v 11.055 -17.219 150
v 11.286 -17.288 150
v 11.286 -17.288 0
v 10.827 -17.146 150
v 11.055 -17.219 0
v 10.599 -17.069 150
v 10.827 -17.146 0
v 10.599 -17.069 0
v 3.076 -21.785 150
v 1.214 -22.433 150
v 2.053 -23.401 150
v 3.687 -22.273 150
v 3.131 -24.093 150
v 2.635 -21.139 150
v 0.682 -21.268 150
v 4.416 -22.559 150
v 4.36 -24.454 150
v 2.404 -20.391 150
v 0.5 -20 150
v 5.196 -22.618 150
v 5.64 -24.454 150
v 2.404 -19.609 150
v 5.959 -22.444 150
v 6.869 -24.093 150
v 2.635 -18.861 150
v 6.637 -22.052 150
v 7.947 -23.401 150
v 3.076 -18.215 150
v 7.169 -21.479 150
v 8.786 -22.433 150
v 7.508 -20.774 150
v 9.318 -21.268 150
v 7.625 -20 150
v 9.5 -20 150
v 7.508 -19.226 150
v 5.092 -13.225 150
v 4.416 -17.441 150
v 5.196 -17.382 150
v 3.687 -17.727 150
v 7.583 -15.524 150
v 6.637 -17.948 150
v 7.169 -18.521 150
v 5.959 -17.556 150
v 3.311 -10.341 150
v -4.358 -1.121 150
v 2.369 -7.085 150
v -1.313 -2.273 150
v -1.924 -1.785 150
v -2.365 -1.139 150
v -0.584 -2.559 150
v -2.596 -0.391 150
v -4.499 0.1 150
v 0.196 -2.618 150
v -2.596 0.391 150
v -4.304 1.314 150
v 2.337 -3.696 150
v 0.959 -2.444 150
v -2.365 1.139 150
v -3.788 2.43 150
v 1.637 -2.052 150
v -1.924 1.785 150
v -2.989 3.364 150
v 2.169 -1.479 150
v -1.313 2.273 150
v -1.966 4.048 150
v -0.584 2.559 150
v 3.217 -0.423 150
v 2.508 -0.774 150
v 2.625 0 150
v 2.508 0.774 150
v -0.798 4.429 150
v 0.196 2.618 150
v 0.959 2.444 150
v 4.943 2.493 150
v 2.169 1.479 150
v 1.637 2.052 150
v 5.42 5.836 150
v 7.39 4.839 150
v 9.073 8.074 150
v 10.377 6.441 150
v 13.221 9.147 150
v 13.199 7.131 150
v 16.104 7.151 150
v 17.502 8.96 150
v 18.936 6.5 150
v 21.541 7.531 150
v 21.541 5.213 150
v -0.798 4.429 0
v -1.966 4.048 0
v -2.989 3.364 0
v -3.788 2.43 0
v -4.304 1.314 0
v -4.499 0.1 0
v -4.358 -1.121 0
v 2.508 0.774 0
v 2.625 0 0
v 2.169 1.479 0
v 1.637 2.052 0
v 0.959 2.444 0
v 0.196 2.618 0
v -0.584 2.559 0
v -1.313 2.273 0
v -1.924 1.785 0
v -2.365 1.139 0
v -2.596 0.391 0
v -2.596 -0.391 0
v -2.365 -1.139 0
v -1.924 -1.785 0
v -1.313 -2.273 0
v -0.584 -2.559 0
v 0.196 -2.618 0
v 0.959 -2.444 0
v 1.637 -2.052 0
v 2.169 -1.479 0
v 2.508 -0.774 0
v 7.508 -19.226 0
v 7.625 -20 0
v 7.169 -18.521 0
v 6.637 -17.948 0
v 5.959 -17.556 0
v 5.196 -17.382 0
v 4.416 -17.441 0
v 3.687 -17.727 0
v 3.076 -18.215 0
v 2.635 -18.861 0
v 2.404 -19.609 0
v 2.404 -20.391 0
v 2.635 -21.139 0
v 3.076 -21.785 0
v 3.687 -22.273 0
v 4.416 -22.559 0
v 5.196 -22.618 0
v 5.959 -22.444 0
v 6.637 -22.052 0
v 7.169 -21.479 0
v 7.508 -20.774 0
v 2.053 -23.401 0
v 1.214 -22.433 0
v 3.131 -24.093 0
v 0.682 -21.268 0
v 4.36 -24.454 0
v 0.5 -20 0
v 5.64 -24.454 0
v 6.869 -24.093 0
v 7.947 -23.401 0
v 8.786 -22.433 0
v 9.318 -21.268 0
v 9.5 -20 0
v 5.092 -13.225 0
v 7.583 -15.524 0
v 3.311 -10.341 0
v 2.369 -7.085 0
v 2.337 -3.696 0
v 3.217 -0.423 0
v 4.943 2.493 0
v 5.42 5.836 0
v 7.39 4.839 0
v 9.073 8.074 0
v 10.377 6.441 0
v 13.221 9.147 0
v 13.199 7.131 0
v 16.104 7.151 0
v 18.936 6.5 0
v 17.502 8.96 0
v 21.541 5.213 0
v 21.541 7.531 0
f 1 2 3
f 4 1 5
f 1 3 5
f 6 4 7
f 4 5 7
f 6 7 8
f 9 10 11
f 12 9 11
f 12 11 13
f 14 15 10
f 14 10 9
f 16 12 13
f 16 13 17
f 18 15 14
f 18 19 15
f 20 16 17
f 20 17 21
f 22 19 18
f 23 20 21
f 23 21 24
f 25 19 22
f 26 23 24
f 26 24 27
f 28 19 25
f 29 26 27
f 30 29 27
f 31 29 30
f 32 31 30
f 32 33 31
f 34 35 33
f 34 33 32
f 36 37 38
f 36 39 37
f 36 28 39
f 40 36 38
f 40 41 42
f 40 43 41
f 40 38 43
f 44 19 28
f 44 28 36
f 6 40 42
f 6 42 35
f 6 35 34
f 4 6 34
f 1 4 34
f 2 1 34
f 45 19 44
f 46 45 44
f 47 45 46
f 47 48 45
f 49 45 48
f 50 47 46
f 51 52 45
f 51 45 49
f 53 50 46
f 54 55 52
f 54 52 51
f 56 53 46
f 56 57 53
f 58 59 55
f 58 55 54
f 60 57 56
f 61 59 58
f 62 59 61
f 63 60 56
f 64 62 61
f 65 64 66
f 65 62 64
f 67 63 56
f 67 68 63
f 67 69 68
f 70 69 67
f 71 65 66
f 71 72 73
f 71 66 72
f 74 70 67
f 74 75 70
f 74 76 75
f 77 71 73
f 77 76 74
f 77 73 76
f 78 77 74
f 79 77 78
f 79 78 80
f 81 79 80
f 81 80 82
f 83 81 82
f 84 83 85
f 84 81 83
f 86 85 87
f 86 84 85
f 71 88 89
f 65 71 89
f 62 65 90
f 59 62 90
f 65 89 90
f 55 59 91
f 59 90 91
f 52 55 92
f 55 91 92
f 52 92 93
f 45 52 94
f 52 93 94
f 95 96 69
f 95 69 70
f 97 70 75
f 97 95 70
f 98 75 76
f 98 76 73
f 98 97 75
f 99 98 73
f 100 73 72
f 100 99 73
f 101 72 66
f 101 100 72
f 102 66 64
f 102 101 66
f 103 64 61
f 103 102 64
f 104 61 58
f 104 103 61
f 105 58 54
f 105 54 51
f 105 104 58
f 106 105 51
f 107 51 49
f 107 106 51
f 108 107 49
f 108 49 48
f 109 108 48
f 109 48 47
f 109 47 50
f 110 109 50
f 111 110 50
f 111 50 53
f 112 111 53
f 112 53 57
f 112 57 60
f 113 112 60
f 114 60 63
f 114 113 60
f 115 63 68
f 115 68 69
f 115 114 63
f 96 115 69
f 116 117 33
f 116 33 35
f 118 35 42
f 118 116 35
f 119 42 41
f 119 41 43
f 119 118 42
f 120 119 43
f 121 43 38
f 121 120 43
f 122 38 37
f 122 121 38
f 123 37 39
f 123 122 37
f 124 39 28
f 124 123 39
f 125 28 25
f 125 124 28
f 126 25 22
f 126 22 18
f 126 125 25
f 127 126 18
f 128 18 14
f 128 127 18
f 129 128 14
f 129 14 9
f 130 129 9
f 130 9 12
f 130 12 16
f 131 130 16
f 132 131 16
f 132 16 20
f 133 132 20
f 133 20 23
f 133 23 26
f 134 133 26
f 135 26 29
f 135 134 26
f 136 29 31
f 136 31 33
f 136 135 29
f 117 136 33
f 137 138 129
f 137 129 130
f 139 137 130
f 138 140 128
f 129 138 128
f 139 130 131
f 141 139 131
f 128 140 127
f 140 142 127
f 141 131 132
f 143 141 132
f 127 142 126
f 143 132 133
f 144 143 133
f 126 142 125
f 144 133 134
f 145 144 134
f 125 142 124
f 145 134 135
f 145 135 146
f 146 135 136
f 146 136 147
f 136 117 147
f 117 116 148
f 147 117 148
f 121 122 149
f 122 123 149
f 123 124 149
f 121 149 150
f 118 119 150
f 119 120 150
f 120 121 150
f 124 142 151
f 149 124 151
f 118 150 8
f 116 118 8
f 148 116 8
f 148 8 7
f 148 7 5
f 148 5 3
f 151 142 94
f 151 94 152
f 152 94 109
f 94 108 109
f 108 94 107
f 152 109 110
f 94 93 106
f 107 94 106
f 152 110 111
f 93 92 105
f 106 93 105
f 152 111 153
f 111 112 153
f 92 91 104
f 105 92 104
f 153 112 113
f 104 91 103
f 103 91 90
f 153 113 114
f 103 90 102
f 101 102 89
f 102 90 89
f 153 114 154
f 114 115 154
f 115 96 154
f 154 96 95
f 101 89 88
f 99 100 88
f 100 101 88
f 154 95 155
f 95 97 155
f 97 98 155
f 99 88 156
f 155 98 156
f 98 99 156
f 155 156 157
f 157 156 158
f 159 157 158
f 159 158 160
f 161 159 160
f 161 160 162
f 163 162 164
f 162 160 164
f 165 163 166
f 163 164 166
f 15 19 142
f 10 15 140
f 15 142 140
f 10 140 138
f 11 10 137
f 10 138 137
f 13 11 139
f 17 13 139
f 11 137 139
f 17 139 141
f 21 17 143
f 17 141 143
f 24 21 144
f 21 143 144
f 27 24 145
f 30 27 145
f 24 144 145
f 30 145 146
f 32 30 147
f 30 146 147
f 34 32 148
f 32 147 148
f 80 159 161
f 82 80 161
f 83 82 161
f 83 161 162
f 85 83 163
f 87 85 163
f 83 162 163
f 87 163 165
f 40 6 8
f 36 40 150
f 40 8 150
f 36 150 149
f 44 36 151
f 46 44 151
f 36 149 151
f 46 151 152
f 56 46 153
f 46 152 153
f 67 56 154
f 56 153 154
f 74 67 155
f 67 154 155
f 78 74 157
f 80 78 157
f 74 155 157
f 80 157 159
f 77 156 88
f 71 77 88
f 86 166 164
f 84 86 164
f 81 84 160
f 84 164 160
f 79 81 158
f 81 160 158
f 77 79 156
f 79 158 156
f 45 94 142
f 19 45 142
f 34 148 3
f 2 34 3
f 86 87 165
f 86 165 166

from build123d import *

# Parameters (mm, degrees)
ESQUISSE1_R        = 2.625
BOSS_EXTRU_1_DEPTH = 150


with BuildPart() as part:
    # Esquisse1 → Boss.-Extru.1 (new body)
    with BuildSketch(Plane.XY):
        with BuildLine():
            ThreePointArc((-0.79755539, 4.428758901), (-3.787637609, 2.429773929), (-4.358021192, -1.12145053))
            Line((-4.358021192, -1.12145053), (0.5, -20))
            ThreePointArc((0.5, -20), (5, -24.5), (9.5, -20))
            Line((9.5, -20), (11.28572177, -17.287605871))
            ThreePointArc((11.28572177, -17.287605871), (10.940890985, -17.183131081), (10.599214607, -17.068761049))
            ThreePointArc((10.599214607, -17.068761049), (2.237966256, -5.391928791), (10.376689651, 6.441078731))
            ThreePointArc((10.376689651, 6.441078731), (16.104400227, 7.151408987), (21.540678755, 5.212823607))
            Line((21.540678755, 5.212823607), (21.540678755, 7.531281515))
            ThreePointArc((21.540678755, 7.531281515), (13.221135766, 9.146884287), (5.419576542, 5.836198326))
            Line((5.419576542, 5.836198326), (-0.79755539, 4.428758901))
        make_face()
        with Locations((5, -20)):
            Circle(ESQUISSE1_R, mode=Mode.SUBTRACT)
        Circle(ESQUISSE1_R, mode=Mode.SUBTRACT)
    extrude(amount=BOSS_EXTRU_1_DEPTH)


solid = part.part
